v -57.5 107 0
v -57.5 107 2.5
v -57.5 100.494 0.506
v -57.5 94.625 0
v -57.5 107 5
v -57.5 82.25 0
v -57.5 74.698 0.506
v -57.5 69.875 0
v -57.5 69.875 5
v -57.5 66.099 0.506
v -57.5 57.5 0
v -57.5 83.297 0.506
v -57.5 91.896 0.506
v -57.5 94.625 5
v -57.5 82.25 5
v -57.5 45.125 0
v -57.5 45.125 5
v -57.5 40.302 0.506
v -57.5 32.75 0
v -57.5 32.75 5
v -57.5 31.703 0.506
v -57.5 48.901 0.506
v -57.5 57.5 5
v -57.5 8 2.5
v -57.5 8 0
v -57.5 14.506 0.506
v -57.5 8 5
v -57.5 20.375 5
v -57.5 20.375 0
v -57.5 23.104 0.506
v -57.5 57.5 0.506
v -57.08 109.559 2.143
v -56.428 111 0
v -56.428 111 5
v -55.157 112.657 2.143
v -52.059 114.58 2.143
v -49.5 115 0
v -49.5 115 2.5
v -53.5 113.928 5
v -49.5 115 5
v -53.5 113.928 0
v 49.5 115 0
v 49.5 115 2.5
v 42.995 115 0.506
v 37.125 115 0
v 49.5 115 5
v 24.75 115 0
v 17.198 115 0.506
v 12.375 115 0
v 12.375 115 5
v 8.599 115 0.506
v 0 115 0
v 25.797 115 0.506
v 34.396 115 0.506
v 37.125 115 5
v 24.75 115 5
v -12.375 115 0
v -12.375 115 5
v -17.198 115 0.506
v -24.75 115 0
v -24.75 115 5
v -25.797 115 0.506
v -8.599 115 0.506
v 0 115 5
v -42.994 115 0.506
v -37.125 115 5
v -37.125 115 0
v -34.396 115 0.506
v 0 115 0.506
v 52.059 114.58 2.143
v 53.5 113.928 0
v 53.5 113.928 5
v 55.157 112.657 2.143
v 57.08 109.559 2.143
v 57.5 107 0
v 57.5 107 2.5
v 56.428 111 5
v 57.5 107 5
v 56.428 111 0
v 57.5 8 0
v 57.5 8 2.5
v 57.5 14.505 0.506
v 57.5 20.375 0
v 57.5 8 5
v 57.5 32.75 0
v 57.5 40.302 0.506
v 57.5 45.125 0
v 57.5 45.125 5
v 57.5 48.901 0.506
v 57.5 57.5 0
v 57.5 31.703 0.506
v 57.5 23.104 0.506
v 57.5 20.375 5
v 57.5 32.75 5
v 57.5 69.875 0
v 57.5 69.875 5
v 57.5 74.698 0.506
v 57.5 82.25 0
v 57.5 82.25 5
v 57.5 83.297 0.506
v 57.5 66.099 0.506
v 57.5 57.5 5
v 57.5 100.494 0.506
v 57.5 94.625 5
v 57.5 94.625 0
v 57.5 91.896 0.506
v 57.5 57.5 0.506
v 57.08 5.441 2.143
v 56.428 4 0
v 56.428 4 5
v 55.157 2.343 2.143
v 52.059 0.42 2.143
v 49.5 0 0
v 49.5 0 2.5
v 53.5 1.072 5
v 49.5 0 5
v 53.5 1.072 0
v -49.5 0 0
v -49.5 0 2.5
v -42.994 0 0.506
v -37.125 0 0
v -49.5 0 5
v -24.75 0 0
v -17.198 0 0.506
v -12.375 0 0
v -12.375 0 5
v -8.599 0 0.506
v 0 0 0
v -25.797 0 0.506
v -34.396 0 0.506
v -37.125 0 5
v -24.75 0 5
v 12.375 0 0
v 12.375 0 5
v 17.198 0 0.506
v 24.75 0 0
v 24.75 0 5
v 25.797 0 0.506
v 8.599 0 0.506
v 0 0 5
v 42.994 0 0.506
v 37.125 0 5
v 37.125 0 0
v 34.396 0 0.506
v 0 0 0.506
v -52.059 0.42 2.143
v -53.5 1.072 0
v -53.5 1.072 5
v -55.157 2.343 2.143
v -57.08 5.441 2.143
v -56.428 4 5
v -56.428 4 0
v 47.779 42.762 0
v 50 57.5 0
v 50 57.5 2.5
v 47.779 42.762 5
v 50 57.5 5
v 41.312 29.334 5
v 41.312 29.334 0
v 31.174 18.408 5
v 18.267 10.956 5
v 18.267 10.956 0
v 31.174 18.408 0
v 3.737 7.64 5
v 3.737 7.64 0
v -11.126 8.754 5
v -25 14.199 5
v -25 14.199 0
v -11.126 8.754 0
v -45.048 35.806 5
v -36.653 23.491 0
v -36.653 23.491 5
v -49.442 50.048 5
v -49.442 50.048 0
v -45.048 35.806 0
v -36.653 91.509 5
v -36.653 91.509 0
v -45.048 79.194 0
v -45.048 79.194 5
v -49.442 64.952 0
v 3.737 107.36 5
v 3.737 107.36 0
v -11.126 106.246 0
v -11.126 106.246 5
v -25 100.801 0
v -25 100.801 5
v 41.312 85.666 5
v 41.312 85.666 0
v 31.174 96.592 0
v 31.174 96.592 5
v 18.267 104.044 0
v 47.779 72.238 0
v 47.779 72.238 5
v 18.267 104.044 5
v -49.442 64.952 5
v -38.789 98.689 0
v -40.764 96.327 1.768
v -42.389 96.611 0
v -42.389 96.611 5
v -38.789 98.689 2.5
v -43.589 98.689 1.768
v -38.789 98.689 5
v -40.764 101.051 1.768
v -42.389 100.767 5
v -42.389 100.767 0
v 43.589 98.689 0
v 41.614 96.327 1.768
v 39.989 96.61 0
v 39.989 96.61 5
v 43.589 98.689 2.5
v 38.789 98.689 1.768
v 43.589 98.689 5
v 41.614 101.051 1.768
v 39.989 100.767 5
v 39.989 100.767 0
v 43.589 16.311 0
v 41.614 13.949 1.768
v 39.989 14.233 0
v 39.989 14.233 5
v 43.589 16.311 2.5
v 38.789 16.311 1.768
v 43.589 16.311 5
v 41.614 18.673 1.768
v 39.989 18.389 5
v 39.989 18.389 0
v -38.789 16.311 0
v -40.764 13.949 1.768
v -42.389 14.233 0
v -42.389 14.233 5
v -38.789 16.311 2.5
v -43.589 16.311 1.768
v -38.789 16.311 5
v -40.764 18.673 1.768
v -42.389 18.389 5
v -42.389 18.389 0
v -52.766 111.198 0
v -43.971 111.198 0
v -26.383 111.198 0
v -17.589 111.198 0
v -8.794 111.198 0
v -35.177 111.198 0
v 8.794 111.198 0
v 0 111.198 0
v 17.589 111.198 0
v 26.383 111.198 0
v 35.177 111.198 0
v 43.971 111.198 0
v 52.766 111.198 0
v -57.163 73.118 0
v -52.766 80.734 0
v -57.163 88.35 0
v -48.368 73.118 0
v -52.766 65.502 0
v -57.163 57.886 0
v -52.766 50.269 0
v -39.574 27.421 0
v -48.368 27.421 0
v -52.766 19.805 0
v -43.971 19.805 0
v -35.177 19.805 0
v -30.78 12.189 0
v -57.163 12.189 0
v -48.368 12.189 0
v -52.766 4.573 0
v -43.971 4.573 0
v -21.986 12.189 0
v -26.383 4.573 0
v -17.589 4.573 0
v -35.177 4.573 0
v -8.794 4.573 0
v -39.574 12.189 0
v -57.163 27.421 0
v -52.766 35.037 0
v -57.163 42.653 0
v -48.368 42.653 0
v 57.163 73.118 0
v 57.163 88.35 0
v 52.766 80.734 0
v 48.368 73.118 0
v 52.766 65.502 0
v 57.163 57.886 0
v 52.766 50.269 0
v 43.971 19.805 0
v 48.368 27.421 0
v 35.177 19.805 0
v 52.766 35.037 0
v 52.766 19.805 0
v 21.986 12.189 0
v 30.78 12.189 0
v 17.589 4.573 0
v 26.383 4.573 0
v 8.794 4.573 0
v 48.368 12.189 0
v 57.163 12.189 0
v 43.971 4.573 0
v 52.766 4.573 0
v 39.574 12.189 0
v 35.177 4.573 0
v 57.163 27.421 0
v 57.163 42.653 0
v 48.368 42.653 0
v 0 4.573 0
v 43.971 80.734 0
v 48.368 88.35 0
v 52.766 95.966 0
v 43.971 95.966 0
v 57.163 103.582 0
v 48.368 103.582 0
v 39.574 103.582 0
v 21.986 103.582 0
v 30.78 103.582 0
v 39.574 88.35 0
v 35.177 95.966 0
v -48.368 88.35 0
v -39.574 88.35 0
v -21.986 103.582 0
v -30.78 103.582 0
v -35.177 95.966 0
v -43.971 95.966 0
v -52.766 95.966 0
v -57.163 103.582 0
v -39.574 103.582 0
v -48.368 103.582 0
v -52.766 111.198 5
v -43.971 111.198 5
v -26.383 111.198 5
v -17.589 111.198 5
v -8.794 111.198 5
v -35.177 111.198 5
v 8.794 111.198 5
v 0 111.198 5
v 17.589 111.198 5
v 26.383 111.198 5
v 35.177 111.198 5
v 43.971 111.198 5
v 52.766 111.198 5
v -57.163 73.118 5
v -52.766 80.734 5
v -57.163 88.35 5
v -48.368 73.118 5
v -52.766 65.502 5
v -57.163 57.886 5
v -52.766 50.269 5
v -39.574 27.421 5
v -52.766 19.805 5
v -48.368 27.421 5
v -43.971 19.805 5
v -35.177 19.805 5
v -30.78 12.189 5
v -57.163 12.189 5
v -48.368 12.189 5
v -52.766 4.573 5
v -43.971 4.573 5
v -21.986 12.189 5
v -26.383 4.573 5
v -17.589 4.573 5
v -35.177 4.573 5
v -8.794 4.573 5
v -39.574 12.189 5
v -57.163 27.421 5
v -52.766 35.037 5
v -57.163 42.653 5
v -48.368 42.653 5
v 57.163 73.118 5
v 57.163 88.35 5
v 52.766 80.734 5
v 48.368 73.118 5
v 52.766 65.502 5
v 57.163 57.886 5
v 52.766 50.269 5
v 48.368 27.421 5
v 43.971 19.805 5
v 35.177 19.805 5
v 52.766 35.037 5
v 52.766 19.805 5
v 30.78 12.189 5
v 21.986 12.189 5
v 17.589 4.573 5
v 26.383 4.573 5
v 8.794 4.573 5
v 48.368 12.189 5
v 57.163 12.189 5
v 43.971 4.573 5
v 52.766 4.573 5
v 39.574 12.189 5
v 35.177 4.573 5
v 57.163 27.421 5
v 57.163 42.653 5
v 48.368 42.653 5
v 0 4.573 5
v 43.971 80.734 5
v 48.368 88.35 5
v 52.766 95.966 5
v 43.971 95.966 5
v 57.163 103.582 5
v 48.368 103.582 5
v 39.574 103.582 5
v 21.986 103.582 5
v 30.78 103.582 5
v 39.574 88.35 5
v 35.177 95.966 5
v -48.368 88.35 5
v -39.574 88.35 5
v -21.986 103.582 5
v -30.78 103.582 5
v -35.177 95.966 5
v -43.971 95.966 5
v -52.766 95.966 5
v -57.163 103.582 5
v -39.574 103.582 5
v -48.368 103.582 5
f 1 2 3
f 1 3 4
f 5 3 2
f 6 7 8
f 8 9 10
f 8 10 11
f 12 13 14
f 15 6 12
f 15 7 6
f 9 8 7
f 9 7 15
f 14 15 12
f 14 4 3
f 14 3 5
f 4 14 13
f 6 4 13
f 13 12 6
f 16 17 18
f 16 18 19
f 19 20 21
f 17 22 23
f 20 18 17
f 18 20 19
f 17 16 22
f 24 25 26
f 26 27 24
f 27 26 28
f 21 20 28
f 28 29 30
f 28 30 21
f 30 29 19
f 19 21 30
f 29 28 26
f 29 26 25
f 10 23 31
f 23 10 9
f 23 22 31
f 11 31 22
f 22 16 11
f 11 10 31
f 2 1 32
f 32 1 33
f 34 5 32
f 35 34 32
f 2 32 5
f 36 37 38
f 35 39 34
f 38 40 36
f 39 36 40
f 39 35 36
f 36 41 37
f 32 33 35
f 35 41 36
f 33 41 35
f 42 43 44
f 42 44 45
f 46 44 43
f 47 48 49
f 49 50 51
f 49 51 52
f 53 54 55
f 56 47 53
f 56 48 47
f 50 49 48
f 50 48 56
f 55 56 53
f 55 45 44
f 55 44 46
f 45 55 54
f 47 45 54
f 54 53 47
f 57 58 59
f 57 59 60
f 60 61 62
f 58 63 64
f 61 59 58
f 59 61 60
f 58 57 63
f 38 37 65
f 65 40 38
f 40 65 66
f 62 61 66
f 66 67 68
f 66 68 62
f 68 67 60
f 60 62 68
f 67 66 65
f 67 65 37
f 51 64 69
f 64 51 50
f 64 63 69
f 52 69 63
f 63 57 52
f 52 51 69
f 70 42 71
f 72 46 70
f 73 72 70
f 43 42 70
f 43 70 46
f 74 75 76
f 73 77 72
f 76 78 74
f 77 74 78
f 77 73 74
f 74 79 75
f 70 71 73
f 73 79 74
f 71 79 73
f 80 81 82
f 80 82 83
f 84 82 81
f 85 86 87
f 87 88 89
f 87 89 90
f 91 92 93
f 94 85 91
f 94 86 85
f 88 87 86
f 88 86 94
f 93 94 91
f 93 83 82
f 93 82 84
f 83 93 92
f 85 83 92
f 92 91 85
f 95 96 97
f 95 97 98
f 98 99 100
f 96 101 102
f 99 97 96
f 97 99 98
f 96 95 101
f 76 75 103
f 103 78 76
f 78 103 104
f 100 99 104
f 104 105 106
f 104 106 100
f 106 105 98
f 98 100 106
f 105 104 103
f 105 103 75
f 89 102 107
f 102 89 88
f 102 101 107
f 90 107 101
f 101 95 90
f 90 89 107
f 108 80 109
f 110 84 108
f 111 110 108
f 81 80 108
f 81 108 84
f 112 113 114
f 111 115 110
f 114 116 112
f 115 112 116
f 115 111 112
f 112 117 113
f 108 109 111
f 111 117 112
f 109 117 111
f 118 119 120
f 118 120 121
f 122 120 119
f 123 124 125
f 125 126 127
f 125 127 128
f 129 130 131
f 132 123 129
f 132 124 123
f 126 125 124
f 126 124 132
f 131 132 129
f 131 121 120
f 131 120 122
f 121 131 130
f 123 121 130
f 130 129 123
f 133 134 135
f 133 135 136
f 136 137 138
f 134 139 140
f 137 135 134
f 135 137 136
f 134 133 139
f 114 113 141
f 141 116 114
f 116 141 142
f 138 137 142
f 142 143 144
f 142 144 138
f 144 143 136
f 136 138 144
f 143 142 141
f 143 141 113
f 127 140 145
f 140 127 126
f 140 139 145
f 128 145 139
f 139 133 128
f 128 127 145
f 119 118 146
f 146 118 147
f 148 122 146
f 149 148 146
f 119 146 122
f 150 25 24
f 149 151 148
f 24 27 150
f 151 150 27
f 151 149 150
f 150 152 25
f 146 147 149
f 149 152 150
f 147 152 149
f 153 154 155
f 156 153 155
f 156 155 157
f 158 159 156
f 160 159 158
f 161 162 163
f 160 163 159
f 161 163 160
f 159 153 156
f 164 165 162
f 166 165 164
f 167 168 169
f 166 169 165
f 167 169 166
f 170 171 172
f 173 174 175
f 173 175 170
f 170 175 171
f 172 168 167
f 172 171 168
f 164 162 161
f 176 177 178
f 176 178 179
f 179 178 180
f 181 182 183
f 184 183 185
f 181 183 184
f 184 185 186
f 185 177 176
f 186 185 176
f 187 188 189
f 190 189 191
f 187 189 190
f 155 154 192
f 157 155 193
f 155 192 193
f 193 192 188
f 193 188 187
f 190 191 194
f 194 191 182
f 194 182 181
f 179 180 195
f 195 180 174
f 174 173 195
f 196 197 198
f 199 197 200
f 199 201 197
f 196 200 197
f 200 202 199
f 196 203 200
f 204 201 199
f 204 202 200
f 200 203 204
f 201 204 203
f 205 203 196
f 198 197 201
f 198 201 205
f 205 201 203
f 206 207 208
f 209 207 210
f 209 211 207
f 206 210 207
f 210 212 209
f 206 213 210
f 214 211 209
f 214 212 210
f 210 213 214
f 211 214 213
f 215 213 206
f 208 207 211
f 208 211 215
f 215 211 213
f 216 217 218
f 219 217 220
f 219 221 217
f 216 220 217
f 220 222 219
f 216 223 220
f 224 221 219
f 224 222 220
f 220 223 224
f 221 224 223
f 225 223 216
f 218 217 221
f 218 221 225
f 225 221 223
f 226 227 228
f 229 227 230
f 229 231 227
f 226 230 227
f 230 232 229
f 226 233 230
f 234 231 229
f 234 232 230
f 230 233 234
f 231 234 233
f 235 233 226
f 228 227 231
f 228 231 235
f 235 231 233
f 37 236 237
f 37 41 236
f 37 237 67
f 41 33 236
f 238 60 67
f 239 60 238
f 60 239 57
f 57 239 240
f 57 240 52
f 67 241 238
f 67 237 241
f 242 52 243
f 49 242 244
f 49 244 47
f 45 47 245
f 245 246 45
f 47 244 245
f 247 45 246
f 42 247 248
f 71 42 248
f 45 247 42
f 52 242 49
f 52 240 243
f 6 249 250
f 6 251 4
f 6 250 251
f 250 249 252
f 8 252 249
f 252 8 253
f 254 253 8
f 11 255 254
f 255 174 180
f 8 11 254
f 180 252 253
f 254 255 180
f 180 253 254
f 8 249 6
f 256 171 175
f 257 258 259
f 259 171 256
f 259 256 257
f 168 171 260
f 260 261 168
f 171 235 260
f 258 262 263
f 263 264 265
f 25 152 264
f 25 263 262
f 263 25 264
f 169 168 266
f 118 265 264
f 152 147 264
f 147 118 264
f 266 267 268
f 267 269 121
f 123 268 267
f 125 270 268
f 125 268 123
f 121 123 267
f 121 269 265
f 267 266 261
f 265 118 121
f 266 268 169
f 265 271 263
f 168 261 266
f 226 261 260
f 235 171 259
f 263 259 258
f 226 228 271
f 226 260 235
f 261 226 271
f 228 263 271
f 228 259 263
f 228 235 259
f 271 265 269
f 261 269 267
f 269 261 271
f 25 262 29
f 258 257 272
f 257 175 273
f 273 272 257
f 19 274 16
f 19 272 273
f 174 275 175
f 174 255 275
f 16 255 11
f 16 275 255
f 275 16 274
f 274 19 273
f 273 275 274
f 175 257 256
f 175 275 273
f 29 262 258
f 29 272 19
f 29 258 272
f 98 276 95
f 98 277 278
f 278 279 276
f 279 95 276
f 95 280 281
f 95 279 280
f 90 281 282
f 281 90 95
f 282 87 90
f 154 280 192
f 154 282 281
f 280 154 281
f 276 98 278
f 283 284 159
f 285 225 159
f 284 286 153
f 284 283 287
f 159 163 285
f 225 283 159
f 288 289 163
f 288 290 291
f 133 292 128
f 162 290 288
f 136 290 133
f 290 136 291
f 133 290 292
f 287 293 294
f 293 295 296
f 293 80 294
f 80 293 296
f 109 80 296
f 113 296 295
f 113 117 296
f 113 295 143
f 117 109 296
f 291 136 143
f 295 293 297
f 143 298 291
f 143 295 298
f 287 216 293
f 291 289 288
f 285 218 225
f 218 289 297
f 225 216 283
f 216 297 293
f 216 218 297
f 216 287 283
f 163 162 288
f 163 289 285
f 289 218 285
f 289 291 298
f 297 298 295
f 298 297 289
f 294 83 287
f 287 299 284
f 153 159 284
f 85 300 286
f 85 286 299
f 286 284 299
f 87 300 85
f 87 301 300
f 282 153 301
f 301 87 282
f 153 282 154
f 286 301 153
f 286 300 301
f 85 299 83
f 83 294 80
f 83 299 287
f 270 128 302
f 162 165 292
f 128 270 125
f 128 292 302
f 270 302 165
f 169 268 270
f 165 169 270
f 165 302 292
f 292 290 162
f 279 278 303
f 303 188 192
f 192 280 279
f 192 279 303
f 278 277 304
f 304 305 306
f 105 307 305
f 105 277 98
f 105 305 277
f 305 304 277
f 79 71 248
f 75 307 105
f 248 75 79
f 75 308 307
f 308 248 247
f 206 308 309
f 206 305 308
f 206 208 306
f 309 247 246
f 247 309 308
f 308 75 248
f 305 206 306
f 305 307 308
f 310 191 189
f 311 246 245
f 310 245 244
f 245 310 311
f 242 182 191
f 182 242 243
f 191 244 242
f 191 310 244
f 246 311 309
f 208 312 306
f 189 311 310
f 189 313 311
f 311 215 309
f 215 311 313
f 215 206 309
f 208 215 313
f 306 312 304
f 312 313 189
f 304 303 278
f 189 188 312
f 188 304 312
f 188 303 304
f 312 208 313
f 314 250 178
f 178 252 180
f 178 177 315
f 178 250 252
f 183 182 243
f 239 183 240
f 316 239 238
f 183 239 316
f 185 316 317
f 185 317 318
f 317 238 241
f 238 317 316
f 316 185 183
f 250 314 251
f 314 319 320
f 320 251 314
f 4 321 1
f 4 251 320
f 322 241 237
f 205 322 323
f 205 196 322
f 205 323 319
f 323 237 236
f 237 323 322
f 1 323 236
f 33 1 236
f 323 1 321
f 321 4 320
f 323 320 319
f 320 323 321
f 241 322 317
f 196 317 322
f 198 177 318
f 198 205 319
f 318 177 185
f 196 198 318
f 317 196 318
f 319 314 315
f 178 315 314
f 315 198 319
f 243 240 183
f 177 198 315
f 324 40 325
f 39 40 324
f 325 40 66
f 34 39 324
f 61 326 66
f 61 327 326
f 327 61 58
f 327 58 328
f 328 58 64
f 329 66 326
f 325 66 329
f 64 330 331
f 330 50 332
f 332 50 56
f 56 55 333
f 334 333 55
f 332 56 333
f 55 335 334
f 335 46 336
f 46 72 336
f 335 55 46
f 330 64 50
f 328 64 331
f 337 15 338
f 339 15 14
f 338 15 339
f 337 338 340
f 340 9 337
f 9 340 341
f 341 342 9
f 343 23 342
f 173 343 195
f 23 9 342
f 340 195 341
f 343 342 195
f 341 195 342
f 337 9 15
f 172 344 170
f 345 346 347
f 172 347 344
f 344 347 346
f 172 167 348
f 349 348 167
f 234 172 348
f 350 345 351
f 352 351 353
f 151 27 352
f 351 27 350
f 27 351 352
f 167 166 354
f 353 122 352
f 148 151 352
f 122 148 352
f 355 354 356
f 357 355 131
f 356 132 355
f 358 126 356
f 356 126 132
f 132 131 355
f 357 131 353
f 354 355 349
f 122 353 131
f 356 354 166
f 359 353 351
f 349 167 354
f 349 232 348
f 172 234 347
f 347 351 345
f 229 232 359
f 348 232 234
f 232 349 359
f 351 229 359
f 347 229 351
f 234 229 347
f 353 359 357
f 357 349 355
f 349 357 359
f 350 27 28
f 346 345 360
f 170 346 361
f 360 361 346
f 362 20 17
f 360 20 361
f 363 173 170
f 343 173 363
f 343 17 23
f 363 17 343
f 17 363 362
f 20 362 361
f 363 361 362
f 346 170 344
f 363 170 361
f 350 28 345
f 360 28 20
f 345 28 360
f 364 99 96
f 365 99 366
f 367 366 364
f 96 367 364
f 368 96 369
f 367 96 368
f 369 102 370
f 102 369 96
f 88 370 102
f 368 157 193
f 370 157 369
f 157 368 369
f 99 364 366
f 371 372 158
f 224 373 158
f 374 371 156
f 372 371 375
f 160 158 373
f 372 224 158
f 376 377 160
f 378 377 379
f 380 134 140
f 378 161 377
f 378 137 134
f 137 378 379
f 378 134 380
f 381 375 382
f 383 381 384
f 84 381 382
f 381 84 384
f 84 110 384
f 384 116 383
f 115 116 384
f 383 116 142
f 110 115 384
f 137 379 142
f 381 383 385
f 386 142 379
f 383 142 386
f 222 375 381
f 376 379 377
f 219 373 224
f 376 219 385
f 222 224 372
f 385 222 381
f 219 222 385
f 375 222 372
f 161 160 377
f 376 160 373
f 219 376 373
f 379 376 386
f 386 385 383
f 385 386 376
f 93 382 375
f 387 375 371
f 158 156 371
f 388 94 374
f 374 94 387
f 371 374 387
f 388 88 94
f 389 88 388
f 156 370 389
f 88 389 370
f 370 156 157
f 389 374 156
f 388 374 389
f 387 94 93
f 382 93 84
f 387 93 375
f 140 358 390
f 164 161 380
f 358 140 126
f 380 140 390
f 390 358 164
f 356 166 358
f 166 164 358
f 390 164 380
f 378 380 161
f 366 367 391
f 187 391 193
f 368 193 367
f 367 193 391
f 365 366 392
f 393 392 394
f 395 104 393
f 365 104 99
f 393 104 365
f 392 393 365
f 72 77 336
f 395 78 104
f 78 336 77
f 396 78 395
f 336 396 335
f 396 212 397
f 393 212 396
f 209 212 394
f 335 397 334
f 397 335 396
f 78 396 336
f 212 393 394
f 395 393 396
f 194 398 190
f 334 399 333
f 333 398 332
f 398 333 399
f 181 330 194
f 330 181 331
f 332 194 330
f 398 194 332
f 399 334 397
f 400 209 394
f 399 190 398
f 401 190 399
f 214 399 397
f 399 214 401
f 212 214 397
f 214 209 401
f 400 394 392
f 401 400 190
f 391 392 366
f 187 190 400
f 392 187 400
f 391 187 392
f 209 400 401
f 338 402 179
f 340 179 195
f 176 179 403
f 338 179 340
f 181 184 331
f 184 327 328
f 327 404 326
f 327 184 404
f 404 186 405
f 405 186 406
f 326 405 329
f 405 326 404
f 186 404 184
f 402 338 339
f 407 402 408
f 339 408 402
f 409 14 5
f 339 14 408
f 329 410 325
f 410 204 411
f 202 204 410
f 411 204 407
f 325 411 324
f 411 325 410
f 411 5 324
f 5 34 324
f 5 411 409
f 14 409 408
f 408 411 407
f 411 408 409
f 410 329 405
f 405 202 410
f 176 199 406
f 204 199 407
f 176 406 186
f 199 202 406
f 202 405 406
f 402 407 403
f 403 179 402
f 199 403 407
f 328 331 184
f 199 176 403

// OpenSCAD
// CSG file generated from FreeCAD 0.18.3.
group() {
 group(){
polyhedron ( points = [[-57.499977,8.000000,0.000000],[-57.499977,8.000000,5.000000],[-57.499977,107.000000,0.000000],[-57.499977,107.000000,5.000000],[-49.499977,115.000000,0.000000],[-49.499977,115.000000,5.000000],[49.500023,115.000000,0.000000],[49.500023,115.000000,5.000000],[57.500023,106.999992,0.000000],[57.500023,106.999992,5.000000],[57.499931,7.999993,0.000000],[57.499931,7.999993,5.000000],[49.499931,0.000000,0.000000],[49.499931,0.000000,5.000000],[-49.499977,0.000000,0.000000],[-49.499977,0.000000,5.000000],[50.000000,57.499977,0.000000],[50.000000,57.499977,5.000000],[-38.788952,98.688965,0.000000],[-38.788952,98.688965,5.000000],[43.588970,98.688950,0.000000],[43.588970,98.688950,5.000000],[43.588951,16.310989,0.000000],[43.588951,16.310989,5.000000],[-38.788971,16.311007,0.000000],[-38.788971,16.311007,5.000000],[-57.499977,8.000000,2.500000],[-57.499977,107.000000,2.500000],[-57.499977,20.375000,0.000000],[-57.499977,32.750000,0.000000],[-57.499977,45.125000,0.000000],[-57.499977,57.500000,0.000000],[-57.499977,69.875000,0.000000],[-57.499977,82.250000,0.000000],[-57.499977,94.625000,0.000000],[-57.499977,20.375000,5.000000],[-57.499977,32.750000,5.000000],[-57.499977,45.125000,5.000000],[-57.499977,57.500000,5.000000],[-57.499977,69.875000,5.000000],[-57.499977,82.250000,5.000000],[-57.499977,94.625000,5.000000],[-49.499977,115.000000,2.500000],[-53.499977,113.928200,0.000000],[-56.428181,111.000000,0.000000],[-53.499977,113.928200,5.000000],[-56.428181,111.000000,5.000000],[49.500023,115.000000,2.500000],[-37.124977,115.000000,0.000000],[-24.749977,115.000000,0.000000],[-12.374977,115.000000,0.000000],[0.000023,115.000000,0.000000],[12.375023,115.000000,0.000000],[24.750023,115.000000,0.000000],[37.125023,115.000000,0.000000],[-37.124977,115.000000,5.000000],[-24.749977,115.000000,5.000000],[-12.374977,115.000000,5.000000],[0.000023,115.000000,5.000000],[12.375023,115.000000,5.000000],[24.750023,115.000000,5.000000],[37.125023,115.000000,5.000000],[57.500023,106.999992,2.500000],[56.428226,110.999992,0.000000],[53.500023,113.928200,0.000000],[56.428226,110.999992,5.000000],[53.500023,113.928200,5.000000],[57.499931,7.999993,2.500000],[57.500011,94.624992,0.000000],[57.500000,82.249992,0.000000],[57.499989,69.874992,0.000000],[57.499977,57.499992,0.000000],[57.499966,45.124992,0.000000],[57.499954,32.749992,0.000000],[57.499943,20.374992,0.000000],[57.500011,94.624992,5.000000],[57.500000,82.249992,5.000000],[57.499989,69.874992,5.000000],[57.499977,57.499992,5.000000],[57.499966,45.124992,5.000000],[57.499954,32.749992,5.000000],[57.499943,20.374992,5.000000],[49.499931,0.000000,2.500000],[53.499931,1.071796,0.000000],[56.428135,3.999996,0.000000],[53.499931,1.071796,5.000000],[56.428135,3.999996,5.000000],[-49.499977,0.000000,2.500000],[37.124943,0.000000,0.000000],[24.749954,0.000000,0.000000],[12.374967,0.000000,0.000000],[-0.000023,0.000000,0.000000],[-12.375011,0.000000,0.000000],[-24.750000,0.000000,0.000000],[-37.124989,0.000000,0.000000],[37.124943,0.000000,5.000000],[24.749954,0.000000,5.000000],[12.374967,0.000000,5.000000],[-0.000023,0.000000,5.000000],[-12.375011,0.000000,5.000000],[-24.750000,0.000000,5.000000],[-37.124989,0.000000,5.000000],[-56.428181,4.000000,0.000000],[-53.499977,1.071797,0.000000],[-56.428181,4.000000,5.000000],[-53.499977,1.071797,5.000000],[50.000000,57.499977,2.500000],[47.778641,72.237740,0.000000],[41.311939,85.665977,0.000000],[31.174490,96.591553,0.000000],[18.267052,104.043663,0.000000],[3.736505,107.360168,0.000000],[-11.126047,106.246376,0.000000],[-25.000000,100.801247,0.000000],[-36.652592,91.508614,0.000000],[-45.048443,79.194168,0.000000],[-49.441540,64.952087,0.000000],[-49.441540,50.047863,0.000000],[-45.048443,35.805790,0.000000],[-36.652592,23.491341,0.000000],[-25.000000,14.198708,0.000000],[-11.126047,8.753582,0.000000],[3.736505,7.639788,0.000000],[18.267052,10.956290,0.000000],[31.174490,18.408403,0.000000],[41.311939,29.333975,0.000000],[47.778641,42.762218,0.000000],[47.778641,72.237740,5.000000],[41.311939,85.665977,5.000000],[31.174490,96.591553,5.000000],[18.267052,104.043663,5.000000],[3.736505,107.360168,5.000000],[-11.126047,106.246376,5.000000],[-25.000000,100.801247,5.000000],[-36.652592,91.508614,5.000000],[-45.048443,79.194168,5.000000],[-49.441540,64.952087,5.000000],[-49.441540,50.047863,5.000000],[-45.048443,35.805790,5.000000],[-36.652592,23.491341,5.000000],[-25.000000,14.198708,5.000000],[-11.126047,8.753582,5.000000],[3.736505,7.639788,5.000000],[18.267052,10.956290,5.000000],[31.174490,18.408403,5.000000],[41.311939,29.333975,5.000000],[47.778641,42.762218,5.000000],[-38.788952,98.688965,2.500000],[-42.388950,100.767426,0.000000],[-42.388950,96.610504,0.000000],[-42.388950,100.767426,5.000000],[-42.388950,96.610504,5.000000],[43.588970,98.688950,2.500000],[39.988972,100.767410,0.000000],[39.988972,96.610489,0.000000],[39.988972,100.767410,5.000000],[39.988972,96.610489,5.000000],[43.588951,16.310989,2.500000],[39.988953,18.389450,0.000000],[39.988953,14.232528,0.000000],[39.988953,18.389450,5.000000],[39.988953,14.232528,5.000000],[-38.788971,16.311007,2.500000],[-42.388969,18.389469,0.000000],[-42.388969,14.232547,0.000000],[-42.388969,18.389469,5.000000],[-42.388969,14.232547,5.000000],[-57.499977,100.494492,0.506270],[-57.499977,83.296700,0.506270],[-57.499977,66.098900,0.506270],[-57.499977,48.901100,0.506270],[-57.499977,31.703304,0.506270],[-57.499977,14.505506,0.506270],[-57.499977,74.697800,0.506270],[-57.499977,91.895599,0.506270],[-57.499977,40.302204,0.506270],[-57.499977,23.104404,0.506270],[-57.499977,57.500000,0.506270],[-52.059067,114.579651,2.143493],[-57.079624,109.559090,2.143493],[-55.156830,112.656853,2.143493],[42.994518,115.000000,0.506270],[25.796719,115.000000,0.506270],[8.598922,115.000000,0.506270],[-8.598876,115.000000,0.506270],[-25.796675,115.000000,0.506270],[-42.994473,115.000000,0.506270],[17.197821,115.000000,0.506270],[34.395618,115.000000,0.506270],[-17.197775,115.000000,0.506270],[-34.395573,115.000000,0.506270],[0.000023,115.000000,0.506270],[57.079670,109.559082,2.143492],[52.059116,114.579643,2.143492],[55.156879,112.656853,2.143492],[57.499939,14.505498,0.506270],[57.499954,31.703297,0.506270],[57.499969,48.901093,0.506270],[57.499985,66.098892,0.506270],[57.500000,83.296692,0.506270],[57.500015,100.494484,0.506270],[57.499962,40.302197,0.506270],[57.499947,23.104397,0.506270],[57.499992,74.697792,0.506270],[57.500008,91.895592,0.506270],[57.499977,57.499992,0.506270],[52.059021,0.420352,2.143494],[57.079578,5.440905,2.143494],[55.156784,2.343143,2.143494],[-42.994484,0.000000,0.506273],[-25.796700,0.000000,0.506273],[-8.598915,0.000000,0.506273],[8.598869,0.000000,0.506273],[25.796654,0.000000,0.506273],[42.994438,0.000000,0.506273],[-17.197807,0.000000,0.506273],[-34.395592,0.000000,0.506273],[17.197762,0.000000,0.506273],[34.395546,0.000000,0.506273],[-0.000023,0.000000,0.506273],[-57.079624,5.440910,2.143493],[-52.059067,0.420352,2.143493],[-55.156830,2.343146,2.143493],[-40.763660,101.050987,1.768302],[-40.763660,96.326950,1.768302],[-43.588951,98.688965,1.768302],[41.614262,101.050964,1.768302],[41.614262,96.326927,1.768302],[38.788971,98.688950,1.768302],[41.614243,18.673006,1.768302],[41.614243,13.948971,1.768302],[38.788952,16.310989,1.768302],[-40.763680,18.673025,1.768302],[-40.763680,13.948990,1.768302],[-43.588970,16.311007,1.768302],[0.000023,111.197929,0.000000],[-35.177044,111.197929,0.000000],[35.177090,111.197929,0.000000],[52.765621,19.805231,0.000000],[-52.765579,19.805231,0.000000],[52.765621,80.733696,0.000000],[-52.765579,80.733696,0.000000],[43.971355,4.573113,0.000000],[26.382822,4.573113,0.000000],[35.177090,19.805231,0.000000],[-26.382778,4.573113,0.000000],[-43.971310,4.573113,0.000000],[-35.177044,19.805231,0.000000],[-52.765579,111.197929,0.000000],[-17.588511,111.197929,0.000000],[17.588556,111.197929,0.000000],[52.765621,111.197929,0.000000],[-52.765579,50.269463,0.000000],[-8.794244,4.573113,0.000000],[52.765621,50.269463,0.000000],[8.794290,4.573113,0.000000],[43.971355,95.965813,0.000000],[-43.971310,95.965813,0.000000],[-43.971310,111.197929,0.000000],[-26.382778,111.197929,0.000000],[-8.794244,111.197929,0.000000],[8.794290,111.197929,0.000000],[26.382822,111.197929,0.000000],[43.971355,111.197929,0.000000],[-57.162712,88.349754,0.000000],[-57.162712,73.117638,0.000000],[-48.368443,73.117638,0.000000],[-52.765579,65.501579,0.000000],[-57.162712,57.885521,0.000000],[-48.368443,27.421289,0.000000],[-39.574177,27.421289,0.000000],[-43.971310,19.805231,0.000000],[-57.162712,12.189172,0.000000],[-48.368443,12.189172,0.000000],[-52.765579,4.573113,0.000000],[-21.985643,12.189172,0.000000],[-17.588511,4.573113,0.000000],[-35.177044,4.573113,0.000000],[-30.779911,12.189172,0.000000],[-39.574177,12.189172,0.000000],[-57.162712,27.421289,0.000000],[-52.765579,35.037346,0.000000],[-48.368443,42.653404,0.000000],[-57.162712,42.653404,0.000000],[57.162758,88.349754,0.000000],[48.368488,73.117638,0.000000],[57.162758,73.117638,0.000000],[52.765621,65.501579,0.000000],[57.162758,57.885521,0.000000],[48.368488,27.421289,0.000000],[43.971355,19.805231,0.000000],[21.985689,12.189172,0.000000],[17.588556,4.573113,0.000000],[48.368488,12.189172,0.000000],[57.162758,12.189172,0.000000],[52.765621,4.573113,0.000000],[35.177090,4.573113,0.000000],[39.574223,12.189172,0.000000],[30.779957,12.189172,0.000000],[57.162758,27.421289,0.000000],[52.765621,35.037346,0.000000],[57.162758,42.653404,0.000000],[48.368488,42.653404,0.000000],[0.000023,4.573113,0.000000],[43.971355,80.733696,0.000000],[48.368488,88.349754,0.000000],[52.765621,95.965813,0.000000],[57.162758,103.581871,0.000000],[48.368488,103.581871,0.000000],[39.574223,103.581871,0.000000],[30.779957,103.581871,0.000000],[21.985689,103.581871,0.000000],[35.177090,95.965813,0.000000],[39.574223,88.349754,0.000000],[-21.985643,103.581871,0.000000],[-30.779911,103.581871,0.000000],[-48.368443,88.349754,0.000000],[-52.765579,95.965813,0.000000],[-39.574177,103.581871,0.000000],[-48.368443,103.581871,0.000000],[-57.162712,103.581871,0.000000],[-35.177044,95.965813,0.000000],[-39.574177,88.349754,0.000000],[0.000023,111.197929,5.000000],[-35.177044,111.197929,5.000000],[35.177090,111.197929,5.000000],[52.765621,19.805231,5.000000],[-52.765579,19.805231,5.000000],[52.765621,80.733696,5.000000],[-52.765579,80.733696,5.000000],[43.971355,4.573113,5.000000],[26.382822,4.573113,5.000000],[35.177090,19.805231,5.000000],[-26.382778,4.573113,5.000000],[-43.971310,4.573113,5.000000],[-35.177044,19.805231,5.000000],[-52.765579,111.197929,5.000000],[-17.588511,111.197929,5.000000],[17.588556,111.197929,5.000000],[52.765621,111.197929,5.000000],[-52.765579,50.269463,5.000000],[-8.794244,4.573113,5.000000],[52.765621,50.269463,5.000000],[8.794290,4.573113,5.000000],[43.971355,95.965813,5.000000],[-43.971310,95.965813,5.000000],[-43.971310,111.197929,5.000000],[-26.382778,111.197929,5.000000],[-8.794244,111.197929,5.000000],[8.794290,111.197929,5.000000],[26.382822,111.197929,5.000000],[43.971355,111.197929,5.000000],[-57.162712,88.349754,5.000000],[-57.162712,73.117638,5.000000],[-48.368443,73.117638,5.000000],[-52.765579,65.501579,5.000000],[-57.162712,57.885521,5.000000],[-48.368443,27.421289,5.000000],[-39.574177,27.421289,5.000000],[-43.971310,19.805231,5.000000],[-57.162712,12.189172,5.000000],[-48.368443,12.189172,5.000000],[-52.765579,4.573113,5.000000],[-21.985643,12.189172,5.000000],[-17.588511,4.573113,5.000000],[-35.177044,4.573113,5.000000],[-30.779911,12.189172,5.000000],[-39.574177,12.189172,5.000000],[-57.162712,27.421289,5.000000],[-52.765579,35.037346,5.000000],[-48.368443,42.653404,5.000000],[-57.162712,42.653404,5.000000],[57.162758,88.349754,5.000000],[48.368488,73.117638,5.000000],[57.162758,73.117638,5.000000],[52.765621,65.501579,5.000000],[57.162758,57.885521,5.000000],[48.368488,27.421289,5.000000],[43.971355,19.805231,5.000000],[21.985689,12.189172,5.000000],[17.588556,4.573113,5.000000],[48.368488,12.189172,5.000000],[57.162758,12.189172,5.000000],[52.765621,4.573113,5.000000],[35.177090,4.573113,5.000000],[39.574223,12.189172,5.000000],[30.779957,12.189172,5.000000],[57.162758,27.421289,5.000000],[52.765621,35.037346,5.000000],[57.162758,42.653404,5.000000],[48.368488,42.653404,5.000000],[0.000023,4.573113,5.000000],[43.971355,80.733696,5.000000],[48.368488,88.349754,5.000000],[52.765621,95.965813,5.000000],[57.162758,103.581871,5.000000],[48.368488,103.581871,5.000000],[39.574223,103.581871,5.000000],[30.779957,103.581871,5.000000],[21.985689,103.581871,5.000000],[35.177090,95.965813,5.000000],[39.574223,88.349754,5.000000],[-21.985643,103.581871,5.000000],[-30.779911,103.581871,5.000000],[-48.368443,88.349754,5.000000],[-52.765579,95.965813,5.000000],[-39.574177,103.581871,5.000000],[-48.368443,103.581871,5.000000],[-57.162712,103.581871,5.000000],[-35.177044,95.965813,5.000000],[-39.574177,88.349754,5.000000]], triangles = [[167,27,2],[34,167,2],[27,167,3],[32,173,33],[169,39,32],[31,169,32],[41,174,168],[168,33,40],[33,173,40],[173,32,39],[40,173,39],[168,40,41],[167,34,41],[3,167,41],[174,41,34],[174,34,33],[33,168,174],[175,37,30],[29,175,30],[171,36,29],[38,170,37],[37,175,36],[29,36,175],[170,30,37],[172,0,26],[26,1,172],[35,172,1],[35,36,171],[176,28,35],[171,176,35],[29,28,176],[176,171,29],[172,35,28],[0,172,28],[177,38,169],[39,169,38],[177,170,38],[170,177,31],[31,30,170],[177,169,31],[179,2,27],[44,2,179],[179,3,46],[179,46,180],[3,179,27],[42,4,178],[46,45,180],[178,5,42],[5,178,45],[178,180,45],[4,43,178],[180,44,179],[178,43,180],[180,43,44],[181,47,6],[54,181,6],[47,181,7],[52,187,53],[183,59,52],[51,183,52],[61,188,182],[182,53,60],[53,187,60],[187,52,59],[60,187,59],[182,60,61],[181,54,61],[7,181,61],[188,61,54],[188,54,53],[53,182,188],[189,57,50],[49,189,50],[185,56,49],[58,184,57],[57,189,56],[49,56,189],[184,50,57],[186,4,42],[42,5,186],[55,186,5],[55,56,185],[190,48,55],[185,190,55],[49,48,190],[190,185,49],[186,55,48],[4,186,48],[191,58,183],[59,183,58],[191,184,58],[184,191,51],[51,50,184],[191,183,51],[64,6,193],[193,7,66],[193,66,194],[193,6,47],[7,193,47],[62,8,192],[66,65,194],[192,9,62],[9,192,65],[192,194,65],[8,63,192],[194,64,193],[192,63,194],[194,63,64],[195,67,10],[74,195,10],[67,195,11],[72,201,73],[197,79,72],[71,197,72],[81,202,196],[196,73,80],[73,201,80],[201,72,79],[80,201,79],[196,80,81],[195,74,81],[11,195,81],[202,81,74],[202,74,73],[73,196,202],[203,77,70],[69,203,70],[199,76,69],[78,198,77],[77,203,76],[69,76,203],[198,70,77],[200,8,62],[62,9,200],[75,200,9],[75,76,199],[204,68,75],[199,204,75],[69,68,204],[204,199,69],[200,75,68],[8,200,68],[205,78,197],[79,197,78],[205,198,78],[198,205,71],[71,70,198],[205,197,71],[84,10,207],[207,11,86],[207,86,208],[207,10,67],[11,207,67],[82,12,206],[86,85,208],[206,13,82],[13,206,85],[206,208,85],[12,83,206],[208,84,207],[206,83,208],[208,83,84],[209,87,14],[94,209,14],[87,209,15],[92,215,93],[211,99,92],[91,211,92],[101,216,210],[210,93,100],[93,215,100],[215,92,99],[100,215,99],[210,100,101],[209,94,101],[15,209,101],[216,101,94],[216,94,93],[93,210,216],[217,97,90],[89,217,90],[213,96,89],[98,212,97],[97,217,96],[89,96,217],[212,90,97],[214,12,82],[82,13,214],[95,214,13],[95,96,213],[218,88,95],[213,218,95],[89,88,218],[218,213,89],[214,95,88],[12,214,88],[219,98,211],[99,211,98],[219,212,98],[212,219,91],[91,90,212],[219,211,91],[221,14,87],[103,14,221],[221,15,105],[221,105,222],[15,221,87],[26,0,220],[105,104,222],[220,1,26],[1,220,104],[220,222,104],[0,102,220],[222,103,221],[220,102,222],[222,102,103],[106,16,126],[106,126,146],[17,106,146],[146,125,145],[145,125,144],[124,123,143],[125,124,144],[144,124,143],[146,126,125],[123,122,142],[142,122,141],[121,120,140],[122,121,141],[141,121,140],[139,119,138],[118,117,137],[138,118,137],[119,118,138],[140,120,139],[120,119,139],[143,123,142],[115,114,134],[135,115,134],[116,115,135],[112,111,131],[113,112,132],[132,112,131],[133,113,132],[134,114,113],[134,113,133],[109,108,128],[110,109,129],[129,109,128],[107,16,106],[127,106,17],[127,107,106],[108,107,127],[128,108,127],[130,110,129],[111,110,130],[131,111,130],[136,116,135],[117,116,136],[136,137,117],[149,224,18],[147,224,151],[224,225,151],[224,147,18],[151,19,147],[147,223,18],[151,225,150],[147,19,150],[150,223,147],[223,150,225],[18,223,148],[225,224,149],[148,225,149],[223,225,148],[154,227,20],[152,227,156],[227,228,156],[227,152,20],[156,21,152],[152,226,20],[156,228,155],[152,21,155],[155,226,152],[226,155,228],[20,226,153],[228,227,154],[153,228,154],[226,228,153],[159,230,22],[157,230,161],[230,231,161],[230,157,22],[161,23,157],[157,229,22],[161,231,160],[157,23,160],[160,229,157],[229,160,231],[22,229,158],[231,230,159],[158,231,159],[229,231,158],[164,233,24],[162,233,166],[233,234,166],[233,162,24],[166,25,162],[162,232,24],[166,234,165],[162,25,165],[165,232,162],[232,165,234],[24,232,163],[234,233,164],[163,234,164],[232,234,163],[258,248,4],[248,43,4],[48,258,4],[248,44,43],[48,49,259],[259,49,249],[50,249,49],[260,249,50],[51,260,50],[259,236,48],[236,258,48],[235,51,261],[250,261,52],[53,250,52],[262,53,54],[54,237,262],[262,250,53],[237,54,263],[251,263,6],[251,6,64],[6,263,54],[52,261,51],[235,260,51],[241,265,33],[34,264,33],[264,241,33],[266,265,241],[265,266,32],[267,32,266],[32,267,268],[268,252,31],[116,117,252],[268,31,32],[267,266,116],[116,252,268],[268,267,116],[33,265,32],[118,119,270],[271,239,269],[270,119,271],[269,270,271],[247,119,120],[120,278,247],[247,163,119],[273,272,239],[246,274,273],[274,102,0],[272,273,0],[274,0,273],[275,120,121],[274,246,14],[274,103,102],[274,14,103],[276,245,275],[94,277,245],[245,276,93],[276,253,92],[93,276,92],[245,93,94],[246,277,94],[278,275,245],[94,14,246],[121,276,275],[273,279,246],[275,278,120],[247,278,24],[271,119,163],[239,271,273],[279,164,24],[163,247,24],[279,24,278],[279,273,164],[273,271,164],[271,163,164],[277,246,279],[245,277,278],[279,278,277],[28,272,0],[280,269,239],[281,118,269],[269,280,281],[30,283,29],[281,280,29],[118,282,117],[282,252,117],[31,252,30],[252,282,30],[283,30,282],[281,29,283],[283,282,281],[270,269,118],[281,282,118],[239,272,28],[29,280,28],[280,239,28],[70,286,69],[240,284,69],[286,285,240],[286,70,285],[288,287,70],[287,285,70],[254,288,71],[70,71,288],[71,72,254],[107,287,16],[288,254,16],[288,16,287],[240,69,286],[125,289,290],[125,158,244],[126,300,289],[238,290,289],[244,124,125],[125,290,158],[124,298,291],[243,292,291],[91,255,90],[291,292,123],[90,292,89],[243,89,292],[255,292,90],[294,293,238],[295,242,293],[294,10,293],[295,293,10],[295,10,84],[242,295,12],[295,83,12],[88,242,12],[295,84,83],[88,89,243],[297,293,242],[243,296,88],[296,242,88],[293,22,238],[291,298,243],[158,159,244],[297,298,159],[290,22,158],[293,297,22],[297,159,22],[290,238,22],[291,123,124],[244,298,124],[244,159,298],[296,243,298],[242,296,297],[298,297,296],[238,74,294],[289,299,238],[289,125,126],[300,301,73],[299,300,73],[299,289,300],[73,301,72],[301,302,72],[302,126,254],[254,72,302],[16,254,126],[126,302,300],[302,301,300],[74,299,73],[10,294,74],[238,299,74],[303,91,253],[255,122,123],[92,253,91],[303,255,91],[122,303,253],[253,276,121],[253,121,122],[255,303,122],[123,292,255],[304,240,285],[107,108,304],[285,287,107],[304,285,107],[305,284,240],[256,306,305],[306,307,68],[69,284,68],[284,306,68],[284,305,306],[251,64,63],[68,307,8],[63,8,251],[307,308,8],[263,251,308],[309,308,20],[308,306,20],[256,154,20],[237,263,309],[308,309,263],[251,8,308],[256,20,306],[308,307,306],[109,110,311],[262,237,310],[250,262,311],[310,311,262],[110,111,261],[235,261,111],[261,250,110],[250,311,110],[309,310,237],[256,313,154],[311,310,109],[310,312,109],[309,153,310],[312,310,153],[309,20,153],[312,153,154],[305,313,256],[109,312,313],[240,304,305],[313,108,109],[313,305,108],[305,304,108],[312,154,313],[115,241,316],[116,266,115],[322,114,115],[266,241,115],[235,111,112],[260,112,249],[259,249,314],[314,249,112],[315,314,113],[321,315,113],[236,259,315],[314,315,259],[112,113,314],[264,316,241],[317,257,316],[316,264,317],[2,320,34],[317,264,34],[258,236,318],[319,318,148],[318,18,148],[257,319,148],[248,258,319],[318,319,258],[248,319,2],[248,2,44],[320,2,319],[317,34,320],[257,317,319],[320,319,317],[315,318,236],[318,315,18],[321,114,149],[257,148,149],[113,114,321],[321,149,18],[321,18,315],[322,316,257],[316,322,115],[257,149,322],[112,260,235],[322,149,114],[346,5,336],[336,5,45],[55,5,346],[336,45,46],[55,347,56],[347,337,56],[57,56,337],[348,57,337],[58,57,348],[347,55,324],[324,55,346],[323,349,58],[338,59,349],[60,59,338],[350,61,60],[61,350,325],[350,60,338],[325,351,61],[339,7,351],[339,66,7],[7,61,351],[59,58,349],[323,58,348],[329,40,353],[41,40,352],[352,40,329],[354,329,353],[353,39,354],[355,354,39],[39,356,355],[356,38,340],[136,340,137],[356,39,38],[355,136,354],[136,356,340],[356,136,355],[40,39,353],[138,358,139],[359,357,327],[358,359,139],[357,359,358],[335,140,139],[140,335,366],[335,139,165],[361,327,360],[334,361,362],[362,1,104],[360,1,361],[362,361,1],[363,141,140],[362,15,334],[362,104,105],[362,105,15],[364,363,333],[101,333,365],[333,100,364],[364,99,341],[100,99,364],[333,101,100],[334,101,365],[366,333,363],[101,334,15],[141,363,364],[361,334,367],[363,140,366],[335,25,366],[359,165,139],[327,361,359],[367,25,166],[165,25,335],[367,366,25],[367,166,361],[361,166,359],[359,166,165],[365,367,334],[333,366,365],[367,365,366],[35,1,360],[368,327,357],[369,357,138],[357,369,368],[37,36,371],[369,36,368],[138,137,370],[370,137,340],[38,37,340],[340,37,370],[371,370,37],[369,371,36],[371,369,370],[358,138,357],[369,138,370],[327,35,360],[36,35,368],[368,35,327],[77,76,374],[328,76,372],[374,328,373],[374,373,77],[376,77,375],[375,77,373],[342,78,376],[77,376,78],[78,342,79],[127,17,375],[376,17,342],[376,375,17],[328,374,76],[145,378,377],[145,332,160],[146,377,388],[326,377,378],[332,145,144],[145,160,378],[144,379,386],[331,379,380],[98,97,343],[379,143,380],[97,96,380],[331,380,96],[343,97,380],[382,326,381],[383,381,330],[382,381,11],[383,11,381],[383,86,11],[330,13,383],[383,13,85],[95,13,330],[383,85,86],[95,331,96],[385,330,381],[331,95,384],[384,95,330],[381,326,23],[379,331,386],[160,332,161],[385,161,386],[378,160,23],[381,23,385],[385,23,161],[378,23,326],[379,144,143],[332,144,386],[332,386,161],[384,386,331],[330,385,384],[386,384,385],[326,382,81],[377,326,387],[377,146,145],[388,80,389],[387,80,388],[387,388,377],[80,79,389],[389,79,390],[390,342,146],[342,390,79],[17,146,342],[146,388,390],[390,388,389],[81,80,387],[11,81,382],[326,81,387],[391,341,98],[343,143,142],[99,98,341],[391,98,343],[142,341,391],[341,141,364],[341,142,141],[343,142,391],[143,343,380],[392,373,328],[127,392,128],[373,127,375],[392,127,373],[393,328,372],[344,393,394],[394,75,395],[76,75,372],[372,75,394],[372,394,393],[339,65,66],[75,9,395],[65,339,9],[395,9,396],[351,396,339],[397,21,396],[396,21,394],[344,21,156],[325,397,351],[396,351,397],[339,396,9],[344,394,21],[396,394,395],[129,399,130],[350,398,325],[338,399,350],[398,350,399],[130,349,131],[323,131,349],[349,130,338],[338,130,399],[397,325,398],[344,156,401],[399,129,398],[398,129,400],[397,398,155],[400,155,398],[397,155,21],[400,156,155],[393,344,401],[129,401,400],[328,393,392],[401,129,128],[401,128,393],[393,128,392],[400,401,156],[135,404,329],[136,135,354],[410,135,134],[354,135,329],[323,132,131],[348,337,132],[347,402,337],[402,132,337],[403,133,402],[409,133,403],[324,403,347],[402,347,403],[132,402,133],[352,329,404],[405,404,345],[404,405,352],[3,41,408],[405,41,352],[346,406,324],[407,150,406],[406,150,19],[345,150,407],[336,407,346],[406,346,407],[336,3,407],[336,46,3],[408,407,3],[405,408,41],[345,407,405],[408,405,407],[403,324,406],[406,19,403],[409,151,134],[345,151,150],[133,409,134],[409,19,151],[409,403,19],[410,345,404],[404,135,410],[345,410,151],[132,323,348],[410,134,151]]);
}
}
